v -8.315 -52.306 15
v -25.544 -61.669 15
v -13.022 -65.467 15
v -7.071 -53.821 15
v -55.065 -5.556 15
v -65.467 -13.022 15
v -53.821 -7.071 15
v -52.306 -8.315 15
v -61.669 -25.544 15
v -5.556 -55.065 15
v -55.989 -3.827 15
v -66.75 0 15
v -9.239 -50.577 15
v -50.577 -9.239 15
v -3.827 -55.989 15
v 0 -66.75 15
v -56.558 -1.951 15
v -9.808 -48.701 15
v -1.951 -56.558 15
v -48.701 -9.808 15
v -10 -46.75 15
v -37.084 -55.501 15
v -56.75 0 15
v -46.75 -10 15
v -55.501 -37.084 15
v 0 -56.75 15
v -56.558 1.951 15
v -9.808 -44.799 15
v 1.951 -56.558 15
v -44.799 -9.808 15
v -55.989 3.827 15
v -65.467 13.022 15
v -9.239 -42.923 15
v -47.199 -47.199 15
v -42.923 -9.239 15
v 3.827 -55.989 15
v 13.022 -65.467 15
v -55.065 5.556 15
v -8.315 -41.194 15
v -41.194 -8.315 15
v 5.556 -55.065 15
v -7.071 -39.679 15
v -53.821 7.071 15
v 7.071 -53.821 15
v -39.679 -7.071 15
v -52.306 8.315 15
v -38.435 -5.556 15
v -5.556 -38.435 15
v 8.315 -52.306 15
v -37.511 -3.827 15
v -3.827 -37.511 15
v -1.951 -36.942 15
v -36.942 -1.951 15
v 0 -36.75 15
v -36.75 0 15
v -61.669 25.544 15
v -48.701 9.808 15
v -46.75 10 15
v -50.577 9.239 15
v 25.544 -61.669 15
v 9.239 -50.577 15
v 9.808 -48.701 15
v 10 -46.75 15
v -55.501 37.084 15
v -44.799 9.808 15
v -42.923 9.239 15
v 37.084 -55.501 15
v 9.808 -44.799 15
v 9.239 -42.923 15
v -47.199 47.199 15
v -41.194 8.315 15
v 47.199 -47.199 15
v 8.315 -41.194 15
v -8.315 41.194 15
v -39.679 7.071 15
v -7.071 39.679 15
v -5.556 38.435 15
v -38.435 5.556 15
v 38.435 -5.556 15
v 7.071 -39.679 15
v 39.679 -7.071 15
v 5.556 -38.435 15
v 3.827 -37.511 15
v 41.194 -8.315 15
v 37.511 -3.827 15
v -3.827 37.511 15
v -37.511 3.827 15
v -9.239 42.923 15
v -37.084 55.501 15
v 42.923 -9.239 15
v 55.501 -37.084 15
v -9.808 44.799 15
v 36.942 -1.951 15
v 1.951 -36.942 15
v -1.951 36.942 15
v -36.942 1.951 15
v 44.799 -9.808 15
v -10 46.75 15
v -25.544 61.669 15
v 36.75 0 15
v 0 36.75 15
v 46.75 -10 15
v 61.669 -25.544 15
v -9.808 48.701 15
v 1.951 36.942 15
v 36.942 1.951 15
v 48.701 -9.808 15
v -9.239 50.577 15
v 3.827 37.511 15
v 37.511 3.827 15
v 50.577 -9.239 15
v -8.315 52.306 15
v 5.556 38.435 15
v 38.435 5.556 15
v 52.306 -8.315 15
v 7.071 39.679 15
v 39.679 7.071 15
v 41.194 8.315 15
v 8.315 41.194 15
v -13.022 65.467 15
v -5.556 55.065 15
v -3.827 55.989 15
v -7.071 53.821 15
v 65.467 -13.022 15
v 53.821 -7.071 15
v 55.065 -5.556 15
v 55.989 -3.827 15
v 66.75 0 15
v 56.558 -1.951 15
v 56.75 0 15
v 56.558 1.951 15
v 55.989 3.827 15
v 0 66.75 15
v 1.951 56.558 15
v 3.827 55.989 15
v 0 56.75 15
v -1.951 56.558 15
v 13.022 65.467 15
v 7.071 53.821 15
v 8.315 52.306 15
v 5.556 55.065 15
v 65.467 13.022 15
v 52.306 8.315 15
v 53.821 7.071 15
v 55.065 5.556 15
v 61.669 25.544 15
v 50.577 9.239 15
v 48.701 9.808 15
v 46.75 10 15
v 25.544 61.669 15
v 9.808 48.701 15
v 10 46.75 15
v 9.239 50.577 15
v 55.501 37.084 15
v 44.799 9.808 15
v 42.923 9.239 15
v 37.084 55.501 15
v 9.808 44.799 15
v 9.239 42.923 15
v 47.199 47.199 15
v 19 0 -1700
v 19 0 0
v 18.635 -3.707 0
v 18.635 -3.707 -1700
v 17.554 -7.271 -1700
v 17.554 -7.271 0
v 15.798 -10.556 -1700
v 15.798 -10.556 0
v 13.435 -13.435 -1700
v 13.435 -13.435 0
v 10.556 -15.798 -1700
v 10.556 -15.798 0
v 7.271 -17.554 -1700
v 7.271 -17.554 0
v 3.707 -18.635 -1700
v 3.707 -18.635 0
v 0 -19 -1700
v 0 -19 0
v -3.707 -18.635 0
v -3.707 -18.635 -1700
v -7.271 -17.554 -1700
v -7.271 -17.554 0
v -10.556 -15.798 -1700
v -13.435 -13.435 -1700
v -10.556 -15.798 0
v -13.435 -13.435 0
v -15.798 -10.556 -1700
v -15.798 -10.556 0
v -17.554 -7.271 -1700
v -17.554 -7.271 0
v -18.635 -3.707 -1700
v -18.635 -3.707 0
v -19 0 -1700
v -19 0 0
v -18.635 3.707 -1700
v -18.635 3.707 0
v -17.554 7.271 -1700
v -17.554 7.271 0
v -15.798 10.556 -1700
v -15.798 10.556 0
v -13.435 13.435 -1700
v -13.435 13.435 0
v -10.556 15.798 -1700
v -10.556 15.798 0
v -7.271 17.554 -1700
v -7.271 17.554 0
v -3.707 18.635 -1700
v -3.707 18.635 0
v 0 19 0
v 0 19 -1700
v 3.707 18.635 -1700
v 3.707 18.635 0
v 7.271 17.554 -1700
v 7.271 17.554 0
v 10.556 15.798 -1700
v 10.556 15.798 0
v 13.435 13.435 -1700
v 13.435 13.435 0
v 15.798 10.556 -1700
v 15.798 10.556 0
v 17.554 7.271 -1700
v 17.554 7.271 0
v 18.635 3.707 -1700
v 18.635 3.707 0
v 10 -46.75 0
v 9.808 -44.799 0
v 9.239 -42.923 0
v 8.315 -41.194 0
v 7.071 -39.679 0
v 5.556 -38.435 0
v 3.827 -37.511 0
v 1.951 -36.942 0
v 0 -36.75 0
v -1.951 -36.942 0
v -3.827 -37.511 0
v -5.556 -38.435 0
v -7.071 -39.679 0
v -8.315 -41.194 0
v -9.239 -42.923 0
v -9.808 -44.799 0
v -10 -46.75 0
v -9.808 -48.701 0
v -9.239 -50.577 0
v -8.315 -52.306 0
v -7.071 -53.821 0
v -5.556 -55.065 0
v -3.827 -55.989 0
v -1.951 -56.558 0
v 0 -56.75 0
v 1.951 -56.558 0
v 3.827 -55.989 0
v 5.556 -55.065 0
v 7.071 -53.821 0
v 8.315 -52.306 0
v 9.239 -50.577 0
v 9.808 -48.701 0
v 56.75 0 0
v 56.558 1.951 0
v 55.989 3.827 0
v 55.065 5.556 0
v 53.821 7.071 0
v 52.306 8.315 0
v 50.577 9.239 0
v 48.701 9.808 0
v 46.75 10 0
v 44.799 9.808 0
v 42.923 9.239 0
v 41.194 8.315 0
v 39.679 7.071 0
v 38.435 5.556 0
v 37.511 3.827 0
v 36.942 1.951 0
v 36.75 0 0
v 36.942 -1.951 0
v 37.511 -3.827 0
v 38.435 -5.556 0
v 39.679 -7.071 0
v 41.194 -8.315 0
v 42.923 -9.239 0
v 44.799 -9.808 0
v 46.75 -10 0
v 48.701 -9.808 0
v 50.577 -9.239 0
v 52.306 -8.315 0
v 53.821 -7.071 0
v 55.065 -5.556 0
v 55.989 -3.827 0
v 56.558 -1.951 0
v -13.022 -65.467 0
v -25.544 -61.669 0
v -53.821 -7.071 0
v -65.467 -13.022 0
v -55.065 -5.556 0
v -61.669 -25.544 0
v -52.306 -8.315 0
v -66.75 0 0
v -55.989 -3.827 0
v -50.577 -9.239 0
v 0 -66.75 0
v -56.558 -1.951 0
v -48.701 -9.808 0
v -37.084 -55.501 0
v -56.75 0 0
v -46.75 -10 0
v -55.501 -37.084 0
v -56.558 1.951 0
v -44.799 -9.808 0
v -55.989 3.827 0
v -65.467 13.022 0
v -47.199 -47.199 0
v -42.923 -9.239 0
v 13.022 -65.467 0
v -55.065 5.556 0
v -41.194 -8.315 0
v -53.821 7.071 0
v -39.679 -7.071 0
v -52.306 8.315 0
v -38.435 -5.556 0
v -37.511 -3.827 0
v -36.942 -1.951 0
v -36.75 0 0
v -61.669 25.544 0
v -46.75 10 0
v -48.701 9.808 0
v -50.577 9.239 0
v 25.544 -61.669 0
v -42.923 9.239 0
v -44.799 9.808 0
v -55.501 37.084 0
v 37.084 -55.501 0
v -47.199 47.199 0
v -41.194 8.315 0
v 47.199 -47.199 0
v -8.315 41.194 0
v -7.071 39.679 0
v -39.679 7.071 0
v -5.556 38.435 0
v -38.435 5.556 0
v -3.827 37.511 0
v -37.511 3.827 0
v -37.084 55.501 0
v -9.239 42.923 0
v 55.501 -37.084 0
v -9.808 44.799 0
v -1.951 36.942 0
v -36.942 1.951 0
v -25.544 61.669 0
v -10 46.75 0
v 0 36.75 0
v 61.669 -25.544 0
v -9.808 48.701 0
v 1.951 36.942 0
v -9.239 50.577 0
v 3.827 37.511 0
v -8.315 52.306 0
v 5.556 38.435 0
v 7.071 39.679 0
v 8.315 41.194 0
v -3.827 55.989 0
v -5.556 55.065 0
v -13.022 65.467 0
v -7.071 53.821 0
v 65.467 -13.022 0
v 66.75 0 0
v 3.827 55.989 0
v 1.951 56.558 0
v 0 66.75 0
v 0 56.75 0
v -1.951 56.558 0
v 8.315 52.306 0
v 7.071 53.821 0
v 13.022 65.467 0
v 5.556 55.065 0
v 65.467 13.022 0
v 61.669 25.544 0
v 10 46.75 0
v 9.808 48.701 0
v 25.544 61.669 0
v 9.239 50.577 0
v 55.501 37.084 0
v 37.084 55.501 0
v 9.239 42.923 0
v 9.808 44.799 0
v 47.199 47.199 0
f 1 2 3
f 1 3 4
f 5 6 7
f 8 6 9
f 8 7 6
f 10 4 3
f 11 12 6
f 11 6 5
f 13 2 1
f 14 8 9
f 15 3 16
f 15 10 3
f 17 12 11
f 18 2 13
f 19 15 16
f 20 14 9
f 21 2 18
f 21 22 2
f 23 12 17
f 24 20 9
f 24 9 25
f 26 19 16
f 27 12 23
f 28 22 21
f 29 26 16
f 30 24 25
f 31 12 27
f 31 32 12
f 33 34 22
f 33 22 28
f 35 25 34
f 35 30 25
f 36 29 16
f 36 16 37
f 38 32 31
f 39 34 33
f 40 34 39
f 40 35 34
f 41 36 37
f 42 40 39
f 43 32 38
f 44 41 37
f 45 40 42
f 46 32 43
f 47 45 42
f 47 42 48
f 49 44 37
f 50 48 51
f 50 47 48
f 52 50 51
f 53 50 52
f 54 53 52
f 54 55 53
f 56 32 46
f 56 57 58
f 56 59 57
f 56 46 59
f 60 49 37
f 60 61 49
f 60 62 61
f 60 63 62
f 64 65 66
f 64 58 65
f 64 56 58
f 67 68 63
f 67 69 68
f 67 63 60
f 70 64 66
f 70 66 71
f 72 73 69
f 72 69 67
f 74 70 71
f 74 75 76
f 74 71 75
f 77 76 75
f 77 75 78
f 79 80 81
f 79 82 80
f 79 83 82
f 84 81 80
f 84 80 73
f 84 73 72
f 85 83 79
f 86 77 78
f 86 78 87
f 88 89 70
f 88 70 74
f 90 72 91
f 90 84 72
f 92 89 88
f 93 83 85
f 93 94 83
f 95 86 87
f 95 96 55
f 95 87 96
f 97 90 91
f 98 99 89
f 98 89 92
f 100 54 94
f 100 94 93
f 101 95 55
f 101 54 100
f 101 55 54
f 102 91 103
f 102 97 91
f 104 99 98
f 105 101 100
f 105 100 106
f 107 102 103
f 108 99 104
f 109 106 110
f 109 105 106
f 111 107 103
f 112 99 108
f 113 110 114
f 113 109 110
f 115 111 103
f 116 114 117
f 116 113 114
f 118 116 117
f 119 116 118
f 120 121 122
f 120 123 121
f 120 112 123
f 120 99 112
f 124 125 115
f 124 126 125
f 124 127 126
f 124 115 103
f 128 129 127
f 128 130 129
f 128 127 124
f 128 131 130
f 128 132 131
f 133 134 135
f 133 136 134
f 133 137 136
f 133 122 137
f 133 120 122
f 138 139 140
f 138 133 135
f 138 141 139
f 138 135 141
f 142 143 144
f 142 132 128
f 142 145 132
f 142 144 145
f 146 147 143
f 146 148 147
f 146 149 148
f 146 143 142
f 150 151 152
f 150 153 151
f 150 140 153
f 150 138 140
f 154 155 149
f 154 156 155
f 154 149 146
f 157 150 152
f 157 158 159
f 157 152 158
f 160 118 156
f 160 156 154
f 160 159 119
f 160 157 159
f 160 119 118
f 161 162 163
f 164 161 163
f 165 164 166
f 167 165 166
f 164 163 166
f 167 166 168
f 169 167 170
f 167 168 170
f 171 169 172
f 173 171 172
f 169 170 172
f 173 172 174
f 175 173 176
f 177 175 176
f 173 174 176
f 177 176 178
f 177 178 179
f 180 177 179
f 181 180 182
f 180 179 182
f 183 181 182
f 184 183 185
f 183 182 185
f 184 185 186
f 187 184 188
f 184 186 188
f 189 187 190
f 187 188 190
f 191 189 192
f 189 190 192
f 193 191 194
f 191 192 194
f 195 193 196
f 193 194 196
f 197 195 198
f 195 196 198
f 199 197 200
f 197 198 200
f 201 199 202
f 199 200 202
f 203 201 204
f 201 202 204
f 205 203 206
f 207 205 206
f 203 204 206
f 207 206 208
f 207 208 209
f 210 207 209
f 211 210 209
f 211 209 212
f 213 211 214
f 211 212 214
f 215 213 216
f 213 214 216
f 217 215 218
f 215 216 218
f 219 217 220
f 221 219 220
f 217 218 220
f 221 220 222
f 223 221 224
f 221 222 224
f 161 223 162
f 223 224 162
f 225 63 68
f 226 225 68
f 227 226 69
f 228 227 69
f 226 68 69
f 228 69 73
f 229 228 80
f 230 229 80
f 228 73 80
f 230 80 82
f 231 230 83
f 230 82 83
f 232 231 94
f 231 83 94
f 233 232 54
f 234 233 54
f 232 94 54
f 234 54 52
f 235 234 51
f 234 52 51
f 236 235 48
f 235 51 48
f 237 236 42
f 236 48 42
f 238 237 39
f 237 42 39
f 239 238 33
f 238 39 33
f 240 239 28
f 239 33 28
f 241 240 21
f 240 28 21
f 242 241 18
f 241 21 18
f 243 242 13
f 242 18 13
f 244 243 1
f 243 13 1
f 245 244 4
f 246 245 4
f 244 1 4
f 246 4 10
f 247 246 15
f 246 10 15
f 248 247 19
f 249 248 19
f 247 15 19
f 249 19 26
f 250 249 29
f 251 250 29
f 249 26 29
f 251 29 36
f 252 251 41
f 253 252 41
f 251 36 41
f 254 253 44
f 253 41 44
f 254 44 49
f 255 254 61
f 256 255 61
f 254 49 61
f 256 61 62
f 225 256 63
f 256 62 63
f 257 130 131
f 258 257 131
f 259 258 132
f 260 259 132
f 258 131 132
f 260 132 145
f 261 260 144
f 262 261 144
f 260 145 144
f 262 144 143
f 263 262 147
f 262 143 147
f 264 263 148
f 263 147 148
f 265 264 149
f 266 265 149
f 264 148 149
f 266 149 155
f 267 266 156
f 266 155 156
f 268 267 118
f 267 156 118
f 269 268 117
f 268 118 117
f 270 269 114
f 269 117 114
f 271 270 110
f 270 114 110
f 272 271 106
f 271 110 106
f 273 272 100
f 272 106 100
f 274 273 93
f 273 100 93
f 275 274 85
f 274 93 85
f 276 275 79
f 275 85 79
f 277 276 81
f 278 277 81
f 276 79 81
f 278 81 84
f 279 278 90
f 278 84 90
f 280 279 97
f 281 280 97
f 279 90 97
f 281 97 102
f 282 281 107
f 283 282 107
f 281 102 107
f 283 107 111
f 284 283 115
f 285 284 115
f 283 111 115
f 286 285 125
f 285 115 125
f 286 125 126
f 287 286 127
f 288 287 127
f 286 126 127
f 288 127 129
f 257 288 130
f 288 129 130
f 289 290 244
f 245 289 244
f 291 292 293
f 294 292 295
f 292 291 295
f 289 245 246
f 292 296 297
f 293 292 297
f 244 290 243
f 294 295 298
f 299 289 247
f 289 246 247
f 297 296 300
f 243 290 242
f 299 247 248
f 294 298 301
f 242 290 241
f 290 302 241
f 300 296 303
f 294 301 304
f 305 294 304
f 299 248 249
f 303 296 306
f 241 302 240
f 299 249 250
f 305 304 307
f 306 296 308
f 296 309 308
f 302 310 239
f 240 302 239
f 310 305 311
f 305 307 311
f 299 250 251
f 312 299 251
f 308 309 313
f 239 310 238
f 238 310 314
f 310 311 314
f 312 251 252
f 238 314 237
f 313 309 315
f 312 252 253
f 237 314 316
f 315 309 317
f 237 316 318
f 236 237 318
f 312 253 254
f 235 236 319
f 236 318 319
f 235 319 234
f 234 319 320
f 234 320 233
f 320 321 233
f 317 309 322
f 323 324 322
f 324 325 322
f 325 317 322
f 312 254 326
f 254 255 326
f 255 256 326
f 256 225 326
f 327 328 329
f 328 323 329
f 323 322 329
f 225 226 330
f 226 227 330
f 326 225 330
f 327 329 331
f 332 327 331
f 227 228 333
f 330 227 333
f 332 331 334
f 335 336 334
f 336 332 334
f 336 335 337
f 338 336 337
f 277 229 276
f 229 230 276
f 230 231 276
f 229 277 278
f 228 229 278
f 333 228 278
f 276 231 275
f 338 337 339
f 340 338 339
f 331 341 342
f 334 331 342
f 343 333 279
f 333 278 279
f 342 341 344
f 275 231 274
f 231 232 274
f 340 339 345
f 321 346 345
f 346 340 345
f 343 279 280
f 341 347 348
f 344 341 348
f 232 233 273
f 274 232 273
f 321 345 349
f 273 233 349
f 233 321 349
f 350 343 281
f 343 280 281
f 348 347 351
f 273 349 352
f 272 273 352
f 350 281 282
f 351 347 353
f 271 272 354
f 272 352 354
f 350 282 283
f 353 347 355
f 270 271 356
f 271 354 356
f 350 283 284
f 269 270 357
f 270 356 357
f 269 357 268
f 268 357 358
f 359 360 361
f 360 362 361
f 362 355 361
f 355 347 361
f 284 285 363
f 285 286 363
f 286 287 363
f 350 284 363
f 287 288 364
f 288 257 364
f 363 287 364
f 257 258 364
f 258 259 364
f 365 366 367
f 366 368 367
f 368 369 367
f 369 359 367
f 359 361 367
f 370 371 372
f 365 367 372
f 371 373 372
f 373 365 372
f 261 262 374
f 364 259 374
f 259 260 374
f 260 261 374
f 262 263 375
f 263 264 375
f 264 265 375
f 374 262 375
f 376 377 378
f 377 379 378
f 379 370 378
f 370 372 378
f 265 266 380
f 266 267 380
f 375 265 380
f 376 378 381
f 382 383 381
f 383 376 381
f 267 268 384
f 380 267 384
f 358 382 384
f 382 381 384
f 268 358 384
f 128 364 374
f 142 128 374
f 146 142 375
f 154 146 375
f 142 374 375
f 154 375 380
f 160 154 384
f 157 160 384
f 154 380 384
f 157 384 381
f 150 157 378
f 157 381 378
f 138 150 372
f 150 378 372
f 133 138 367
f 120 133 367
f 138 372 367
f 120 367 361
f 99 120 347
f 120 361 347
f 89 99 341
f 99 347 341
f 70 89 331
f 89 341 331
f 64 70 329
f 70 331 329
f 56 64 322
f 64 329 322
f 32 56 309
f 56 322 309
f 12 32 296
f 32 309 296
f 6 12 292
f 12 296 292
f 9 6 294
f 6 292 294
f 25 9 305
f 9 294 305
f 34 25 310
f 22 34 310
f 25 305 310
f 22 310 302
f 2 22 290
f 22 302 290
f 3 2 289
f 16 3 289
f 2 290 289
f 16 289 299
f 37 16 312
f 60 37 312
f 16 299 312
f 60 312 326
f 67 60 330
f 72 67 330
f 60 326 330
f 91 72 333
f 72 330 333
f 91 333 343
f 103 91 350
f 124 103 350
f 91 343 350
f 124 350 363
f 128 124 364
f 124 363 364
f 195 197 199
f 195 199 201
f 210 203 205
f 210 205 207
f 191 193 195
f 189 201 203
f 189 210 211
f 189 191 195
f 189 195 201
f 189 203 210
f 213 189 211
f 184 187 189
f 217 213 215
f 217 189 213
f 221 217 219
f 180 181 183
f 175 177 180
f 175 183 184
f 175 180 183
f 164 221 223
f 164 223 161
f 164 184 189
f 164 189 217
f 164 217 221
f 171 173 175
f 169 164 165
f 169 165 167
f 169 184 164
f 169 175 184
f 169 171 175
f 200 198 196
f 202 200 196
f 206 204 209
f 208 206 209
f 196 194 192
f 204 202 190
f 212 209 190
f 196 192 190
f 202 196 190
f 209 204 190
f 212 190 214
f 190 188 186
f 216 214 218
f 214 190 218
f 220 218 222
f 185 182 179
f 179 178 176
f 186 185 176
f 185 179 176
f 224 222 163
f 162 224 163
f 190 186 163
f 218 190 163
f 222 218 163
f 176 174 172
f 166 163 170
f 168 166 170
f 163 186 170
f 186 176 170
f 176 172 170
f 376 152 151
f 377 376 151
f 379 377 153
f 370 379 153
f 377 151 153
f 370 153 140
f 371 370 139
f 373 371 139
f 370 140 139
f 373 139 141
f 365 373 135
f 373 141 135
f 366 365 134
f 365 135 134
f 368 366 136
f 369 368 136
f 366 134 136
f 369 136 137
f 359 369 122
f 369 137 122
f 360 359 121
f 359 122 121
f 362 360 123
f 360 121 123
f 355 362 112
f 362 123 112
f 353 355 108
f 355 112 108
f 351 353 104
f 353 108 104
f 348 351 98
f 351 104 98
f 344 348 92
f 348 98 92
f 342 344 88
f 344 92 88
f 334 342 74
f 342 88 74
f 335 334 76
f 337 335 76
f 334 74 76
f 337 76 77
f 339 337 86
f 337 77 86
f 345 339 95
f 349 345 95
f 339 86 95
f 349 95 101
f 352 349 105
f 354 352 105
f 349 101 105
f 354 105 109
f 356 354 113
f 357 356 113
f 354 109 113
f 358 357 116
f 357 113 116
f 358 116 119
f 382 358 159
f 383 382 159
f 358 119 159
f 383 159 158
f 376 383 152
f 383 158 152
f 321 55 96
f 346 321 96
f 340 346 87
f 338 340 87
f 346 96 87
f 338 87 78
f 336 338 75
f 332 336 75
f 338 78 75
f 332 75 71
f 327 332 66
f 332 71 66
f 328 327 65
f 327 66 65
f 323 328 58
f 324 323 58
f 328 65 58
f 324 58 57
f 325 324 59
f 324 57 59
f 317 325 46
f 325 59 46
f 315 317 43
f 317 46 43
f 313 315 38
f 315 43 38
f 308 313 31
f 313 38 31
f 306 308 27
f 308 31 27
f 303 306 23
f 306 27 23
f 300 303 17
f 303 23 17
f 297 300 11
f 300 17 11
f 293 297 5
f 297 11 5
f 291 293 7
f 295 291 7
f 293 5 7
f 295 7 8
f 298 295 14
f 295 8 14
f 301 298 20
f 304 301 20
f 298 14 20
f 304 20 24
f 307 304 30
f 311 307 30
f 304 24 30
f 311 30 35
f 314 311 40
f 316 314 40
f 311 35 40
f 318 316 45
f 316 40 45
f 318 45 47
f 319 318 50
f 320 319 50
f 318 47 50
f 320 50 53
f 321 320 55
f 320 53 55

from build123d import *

# Parameters (mm, degrees)
F0_R     = 66.75
F1_DEPTH = 15
F2_R     = 19
F3_DEPTH = 1700
F4_R     = 10
F5_DEPTH = 15


with BuildPart() as f1:
    # F0 (on Top) → F1 (new body)
    with BuildSketch(Plane.XY):
        Circle(F0_R)
    extrude(amount=F1_DEPTH)

    # F4 (on face) → F5 (cut, through all)
    with BuildSketch(Plane.XY.offset(15)):
        with Locations((46.75, 0)):
            Circle(F4_R)
        with Locations((0, 46.75)):
            Circle(F4_R)
        with Locations((-46.75, 0)):
            Circle(F4_R)
        with Locations((0, -46.75)):
            Circle(F4_R)
    extrude(amount=-F5_DEPTH, mode=Mode.SUBTRACT)


with BuildPart() as f3:
    # F2 (on face) → F3 (new body)
    with BuildSketch(Plane(origin=(0, 0, 0), x_dir=(1, 0, 0), z_dir=(0, 0, -1))):
        Circle(F2_R)
    extrude(amount=F3_DEPTH)


solid = Compound([f1.part, f3.part])
